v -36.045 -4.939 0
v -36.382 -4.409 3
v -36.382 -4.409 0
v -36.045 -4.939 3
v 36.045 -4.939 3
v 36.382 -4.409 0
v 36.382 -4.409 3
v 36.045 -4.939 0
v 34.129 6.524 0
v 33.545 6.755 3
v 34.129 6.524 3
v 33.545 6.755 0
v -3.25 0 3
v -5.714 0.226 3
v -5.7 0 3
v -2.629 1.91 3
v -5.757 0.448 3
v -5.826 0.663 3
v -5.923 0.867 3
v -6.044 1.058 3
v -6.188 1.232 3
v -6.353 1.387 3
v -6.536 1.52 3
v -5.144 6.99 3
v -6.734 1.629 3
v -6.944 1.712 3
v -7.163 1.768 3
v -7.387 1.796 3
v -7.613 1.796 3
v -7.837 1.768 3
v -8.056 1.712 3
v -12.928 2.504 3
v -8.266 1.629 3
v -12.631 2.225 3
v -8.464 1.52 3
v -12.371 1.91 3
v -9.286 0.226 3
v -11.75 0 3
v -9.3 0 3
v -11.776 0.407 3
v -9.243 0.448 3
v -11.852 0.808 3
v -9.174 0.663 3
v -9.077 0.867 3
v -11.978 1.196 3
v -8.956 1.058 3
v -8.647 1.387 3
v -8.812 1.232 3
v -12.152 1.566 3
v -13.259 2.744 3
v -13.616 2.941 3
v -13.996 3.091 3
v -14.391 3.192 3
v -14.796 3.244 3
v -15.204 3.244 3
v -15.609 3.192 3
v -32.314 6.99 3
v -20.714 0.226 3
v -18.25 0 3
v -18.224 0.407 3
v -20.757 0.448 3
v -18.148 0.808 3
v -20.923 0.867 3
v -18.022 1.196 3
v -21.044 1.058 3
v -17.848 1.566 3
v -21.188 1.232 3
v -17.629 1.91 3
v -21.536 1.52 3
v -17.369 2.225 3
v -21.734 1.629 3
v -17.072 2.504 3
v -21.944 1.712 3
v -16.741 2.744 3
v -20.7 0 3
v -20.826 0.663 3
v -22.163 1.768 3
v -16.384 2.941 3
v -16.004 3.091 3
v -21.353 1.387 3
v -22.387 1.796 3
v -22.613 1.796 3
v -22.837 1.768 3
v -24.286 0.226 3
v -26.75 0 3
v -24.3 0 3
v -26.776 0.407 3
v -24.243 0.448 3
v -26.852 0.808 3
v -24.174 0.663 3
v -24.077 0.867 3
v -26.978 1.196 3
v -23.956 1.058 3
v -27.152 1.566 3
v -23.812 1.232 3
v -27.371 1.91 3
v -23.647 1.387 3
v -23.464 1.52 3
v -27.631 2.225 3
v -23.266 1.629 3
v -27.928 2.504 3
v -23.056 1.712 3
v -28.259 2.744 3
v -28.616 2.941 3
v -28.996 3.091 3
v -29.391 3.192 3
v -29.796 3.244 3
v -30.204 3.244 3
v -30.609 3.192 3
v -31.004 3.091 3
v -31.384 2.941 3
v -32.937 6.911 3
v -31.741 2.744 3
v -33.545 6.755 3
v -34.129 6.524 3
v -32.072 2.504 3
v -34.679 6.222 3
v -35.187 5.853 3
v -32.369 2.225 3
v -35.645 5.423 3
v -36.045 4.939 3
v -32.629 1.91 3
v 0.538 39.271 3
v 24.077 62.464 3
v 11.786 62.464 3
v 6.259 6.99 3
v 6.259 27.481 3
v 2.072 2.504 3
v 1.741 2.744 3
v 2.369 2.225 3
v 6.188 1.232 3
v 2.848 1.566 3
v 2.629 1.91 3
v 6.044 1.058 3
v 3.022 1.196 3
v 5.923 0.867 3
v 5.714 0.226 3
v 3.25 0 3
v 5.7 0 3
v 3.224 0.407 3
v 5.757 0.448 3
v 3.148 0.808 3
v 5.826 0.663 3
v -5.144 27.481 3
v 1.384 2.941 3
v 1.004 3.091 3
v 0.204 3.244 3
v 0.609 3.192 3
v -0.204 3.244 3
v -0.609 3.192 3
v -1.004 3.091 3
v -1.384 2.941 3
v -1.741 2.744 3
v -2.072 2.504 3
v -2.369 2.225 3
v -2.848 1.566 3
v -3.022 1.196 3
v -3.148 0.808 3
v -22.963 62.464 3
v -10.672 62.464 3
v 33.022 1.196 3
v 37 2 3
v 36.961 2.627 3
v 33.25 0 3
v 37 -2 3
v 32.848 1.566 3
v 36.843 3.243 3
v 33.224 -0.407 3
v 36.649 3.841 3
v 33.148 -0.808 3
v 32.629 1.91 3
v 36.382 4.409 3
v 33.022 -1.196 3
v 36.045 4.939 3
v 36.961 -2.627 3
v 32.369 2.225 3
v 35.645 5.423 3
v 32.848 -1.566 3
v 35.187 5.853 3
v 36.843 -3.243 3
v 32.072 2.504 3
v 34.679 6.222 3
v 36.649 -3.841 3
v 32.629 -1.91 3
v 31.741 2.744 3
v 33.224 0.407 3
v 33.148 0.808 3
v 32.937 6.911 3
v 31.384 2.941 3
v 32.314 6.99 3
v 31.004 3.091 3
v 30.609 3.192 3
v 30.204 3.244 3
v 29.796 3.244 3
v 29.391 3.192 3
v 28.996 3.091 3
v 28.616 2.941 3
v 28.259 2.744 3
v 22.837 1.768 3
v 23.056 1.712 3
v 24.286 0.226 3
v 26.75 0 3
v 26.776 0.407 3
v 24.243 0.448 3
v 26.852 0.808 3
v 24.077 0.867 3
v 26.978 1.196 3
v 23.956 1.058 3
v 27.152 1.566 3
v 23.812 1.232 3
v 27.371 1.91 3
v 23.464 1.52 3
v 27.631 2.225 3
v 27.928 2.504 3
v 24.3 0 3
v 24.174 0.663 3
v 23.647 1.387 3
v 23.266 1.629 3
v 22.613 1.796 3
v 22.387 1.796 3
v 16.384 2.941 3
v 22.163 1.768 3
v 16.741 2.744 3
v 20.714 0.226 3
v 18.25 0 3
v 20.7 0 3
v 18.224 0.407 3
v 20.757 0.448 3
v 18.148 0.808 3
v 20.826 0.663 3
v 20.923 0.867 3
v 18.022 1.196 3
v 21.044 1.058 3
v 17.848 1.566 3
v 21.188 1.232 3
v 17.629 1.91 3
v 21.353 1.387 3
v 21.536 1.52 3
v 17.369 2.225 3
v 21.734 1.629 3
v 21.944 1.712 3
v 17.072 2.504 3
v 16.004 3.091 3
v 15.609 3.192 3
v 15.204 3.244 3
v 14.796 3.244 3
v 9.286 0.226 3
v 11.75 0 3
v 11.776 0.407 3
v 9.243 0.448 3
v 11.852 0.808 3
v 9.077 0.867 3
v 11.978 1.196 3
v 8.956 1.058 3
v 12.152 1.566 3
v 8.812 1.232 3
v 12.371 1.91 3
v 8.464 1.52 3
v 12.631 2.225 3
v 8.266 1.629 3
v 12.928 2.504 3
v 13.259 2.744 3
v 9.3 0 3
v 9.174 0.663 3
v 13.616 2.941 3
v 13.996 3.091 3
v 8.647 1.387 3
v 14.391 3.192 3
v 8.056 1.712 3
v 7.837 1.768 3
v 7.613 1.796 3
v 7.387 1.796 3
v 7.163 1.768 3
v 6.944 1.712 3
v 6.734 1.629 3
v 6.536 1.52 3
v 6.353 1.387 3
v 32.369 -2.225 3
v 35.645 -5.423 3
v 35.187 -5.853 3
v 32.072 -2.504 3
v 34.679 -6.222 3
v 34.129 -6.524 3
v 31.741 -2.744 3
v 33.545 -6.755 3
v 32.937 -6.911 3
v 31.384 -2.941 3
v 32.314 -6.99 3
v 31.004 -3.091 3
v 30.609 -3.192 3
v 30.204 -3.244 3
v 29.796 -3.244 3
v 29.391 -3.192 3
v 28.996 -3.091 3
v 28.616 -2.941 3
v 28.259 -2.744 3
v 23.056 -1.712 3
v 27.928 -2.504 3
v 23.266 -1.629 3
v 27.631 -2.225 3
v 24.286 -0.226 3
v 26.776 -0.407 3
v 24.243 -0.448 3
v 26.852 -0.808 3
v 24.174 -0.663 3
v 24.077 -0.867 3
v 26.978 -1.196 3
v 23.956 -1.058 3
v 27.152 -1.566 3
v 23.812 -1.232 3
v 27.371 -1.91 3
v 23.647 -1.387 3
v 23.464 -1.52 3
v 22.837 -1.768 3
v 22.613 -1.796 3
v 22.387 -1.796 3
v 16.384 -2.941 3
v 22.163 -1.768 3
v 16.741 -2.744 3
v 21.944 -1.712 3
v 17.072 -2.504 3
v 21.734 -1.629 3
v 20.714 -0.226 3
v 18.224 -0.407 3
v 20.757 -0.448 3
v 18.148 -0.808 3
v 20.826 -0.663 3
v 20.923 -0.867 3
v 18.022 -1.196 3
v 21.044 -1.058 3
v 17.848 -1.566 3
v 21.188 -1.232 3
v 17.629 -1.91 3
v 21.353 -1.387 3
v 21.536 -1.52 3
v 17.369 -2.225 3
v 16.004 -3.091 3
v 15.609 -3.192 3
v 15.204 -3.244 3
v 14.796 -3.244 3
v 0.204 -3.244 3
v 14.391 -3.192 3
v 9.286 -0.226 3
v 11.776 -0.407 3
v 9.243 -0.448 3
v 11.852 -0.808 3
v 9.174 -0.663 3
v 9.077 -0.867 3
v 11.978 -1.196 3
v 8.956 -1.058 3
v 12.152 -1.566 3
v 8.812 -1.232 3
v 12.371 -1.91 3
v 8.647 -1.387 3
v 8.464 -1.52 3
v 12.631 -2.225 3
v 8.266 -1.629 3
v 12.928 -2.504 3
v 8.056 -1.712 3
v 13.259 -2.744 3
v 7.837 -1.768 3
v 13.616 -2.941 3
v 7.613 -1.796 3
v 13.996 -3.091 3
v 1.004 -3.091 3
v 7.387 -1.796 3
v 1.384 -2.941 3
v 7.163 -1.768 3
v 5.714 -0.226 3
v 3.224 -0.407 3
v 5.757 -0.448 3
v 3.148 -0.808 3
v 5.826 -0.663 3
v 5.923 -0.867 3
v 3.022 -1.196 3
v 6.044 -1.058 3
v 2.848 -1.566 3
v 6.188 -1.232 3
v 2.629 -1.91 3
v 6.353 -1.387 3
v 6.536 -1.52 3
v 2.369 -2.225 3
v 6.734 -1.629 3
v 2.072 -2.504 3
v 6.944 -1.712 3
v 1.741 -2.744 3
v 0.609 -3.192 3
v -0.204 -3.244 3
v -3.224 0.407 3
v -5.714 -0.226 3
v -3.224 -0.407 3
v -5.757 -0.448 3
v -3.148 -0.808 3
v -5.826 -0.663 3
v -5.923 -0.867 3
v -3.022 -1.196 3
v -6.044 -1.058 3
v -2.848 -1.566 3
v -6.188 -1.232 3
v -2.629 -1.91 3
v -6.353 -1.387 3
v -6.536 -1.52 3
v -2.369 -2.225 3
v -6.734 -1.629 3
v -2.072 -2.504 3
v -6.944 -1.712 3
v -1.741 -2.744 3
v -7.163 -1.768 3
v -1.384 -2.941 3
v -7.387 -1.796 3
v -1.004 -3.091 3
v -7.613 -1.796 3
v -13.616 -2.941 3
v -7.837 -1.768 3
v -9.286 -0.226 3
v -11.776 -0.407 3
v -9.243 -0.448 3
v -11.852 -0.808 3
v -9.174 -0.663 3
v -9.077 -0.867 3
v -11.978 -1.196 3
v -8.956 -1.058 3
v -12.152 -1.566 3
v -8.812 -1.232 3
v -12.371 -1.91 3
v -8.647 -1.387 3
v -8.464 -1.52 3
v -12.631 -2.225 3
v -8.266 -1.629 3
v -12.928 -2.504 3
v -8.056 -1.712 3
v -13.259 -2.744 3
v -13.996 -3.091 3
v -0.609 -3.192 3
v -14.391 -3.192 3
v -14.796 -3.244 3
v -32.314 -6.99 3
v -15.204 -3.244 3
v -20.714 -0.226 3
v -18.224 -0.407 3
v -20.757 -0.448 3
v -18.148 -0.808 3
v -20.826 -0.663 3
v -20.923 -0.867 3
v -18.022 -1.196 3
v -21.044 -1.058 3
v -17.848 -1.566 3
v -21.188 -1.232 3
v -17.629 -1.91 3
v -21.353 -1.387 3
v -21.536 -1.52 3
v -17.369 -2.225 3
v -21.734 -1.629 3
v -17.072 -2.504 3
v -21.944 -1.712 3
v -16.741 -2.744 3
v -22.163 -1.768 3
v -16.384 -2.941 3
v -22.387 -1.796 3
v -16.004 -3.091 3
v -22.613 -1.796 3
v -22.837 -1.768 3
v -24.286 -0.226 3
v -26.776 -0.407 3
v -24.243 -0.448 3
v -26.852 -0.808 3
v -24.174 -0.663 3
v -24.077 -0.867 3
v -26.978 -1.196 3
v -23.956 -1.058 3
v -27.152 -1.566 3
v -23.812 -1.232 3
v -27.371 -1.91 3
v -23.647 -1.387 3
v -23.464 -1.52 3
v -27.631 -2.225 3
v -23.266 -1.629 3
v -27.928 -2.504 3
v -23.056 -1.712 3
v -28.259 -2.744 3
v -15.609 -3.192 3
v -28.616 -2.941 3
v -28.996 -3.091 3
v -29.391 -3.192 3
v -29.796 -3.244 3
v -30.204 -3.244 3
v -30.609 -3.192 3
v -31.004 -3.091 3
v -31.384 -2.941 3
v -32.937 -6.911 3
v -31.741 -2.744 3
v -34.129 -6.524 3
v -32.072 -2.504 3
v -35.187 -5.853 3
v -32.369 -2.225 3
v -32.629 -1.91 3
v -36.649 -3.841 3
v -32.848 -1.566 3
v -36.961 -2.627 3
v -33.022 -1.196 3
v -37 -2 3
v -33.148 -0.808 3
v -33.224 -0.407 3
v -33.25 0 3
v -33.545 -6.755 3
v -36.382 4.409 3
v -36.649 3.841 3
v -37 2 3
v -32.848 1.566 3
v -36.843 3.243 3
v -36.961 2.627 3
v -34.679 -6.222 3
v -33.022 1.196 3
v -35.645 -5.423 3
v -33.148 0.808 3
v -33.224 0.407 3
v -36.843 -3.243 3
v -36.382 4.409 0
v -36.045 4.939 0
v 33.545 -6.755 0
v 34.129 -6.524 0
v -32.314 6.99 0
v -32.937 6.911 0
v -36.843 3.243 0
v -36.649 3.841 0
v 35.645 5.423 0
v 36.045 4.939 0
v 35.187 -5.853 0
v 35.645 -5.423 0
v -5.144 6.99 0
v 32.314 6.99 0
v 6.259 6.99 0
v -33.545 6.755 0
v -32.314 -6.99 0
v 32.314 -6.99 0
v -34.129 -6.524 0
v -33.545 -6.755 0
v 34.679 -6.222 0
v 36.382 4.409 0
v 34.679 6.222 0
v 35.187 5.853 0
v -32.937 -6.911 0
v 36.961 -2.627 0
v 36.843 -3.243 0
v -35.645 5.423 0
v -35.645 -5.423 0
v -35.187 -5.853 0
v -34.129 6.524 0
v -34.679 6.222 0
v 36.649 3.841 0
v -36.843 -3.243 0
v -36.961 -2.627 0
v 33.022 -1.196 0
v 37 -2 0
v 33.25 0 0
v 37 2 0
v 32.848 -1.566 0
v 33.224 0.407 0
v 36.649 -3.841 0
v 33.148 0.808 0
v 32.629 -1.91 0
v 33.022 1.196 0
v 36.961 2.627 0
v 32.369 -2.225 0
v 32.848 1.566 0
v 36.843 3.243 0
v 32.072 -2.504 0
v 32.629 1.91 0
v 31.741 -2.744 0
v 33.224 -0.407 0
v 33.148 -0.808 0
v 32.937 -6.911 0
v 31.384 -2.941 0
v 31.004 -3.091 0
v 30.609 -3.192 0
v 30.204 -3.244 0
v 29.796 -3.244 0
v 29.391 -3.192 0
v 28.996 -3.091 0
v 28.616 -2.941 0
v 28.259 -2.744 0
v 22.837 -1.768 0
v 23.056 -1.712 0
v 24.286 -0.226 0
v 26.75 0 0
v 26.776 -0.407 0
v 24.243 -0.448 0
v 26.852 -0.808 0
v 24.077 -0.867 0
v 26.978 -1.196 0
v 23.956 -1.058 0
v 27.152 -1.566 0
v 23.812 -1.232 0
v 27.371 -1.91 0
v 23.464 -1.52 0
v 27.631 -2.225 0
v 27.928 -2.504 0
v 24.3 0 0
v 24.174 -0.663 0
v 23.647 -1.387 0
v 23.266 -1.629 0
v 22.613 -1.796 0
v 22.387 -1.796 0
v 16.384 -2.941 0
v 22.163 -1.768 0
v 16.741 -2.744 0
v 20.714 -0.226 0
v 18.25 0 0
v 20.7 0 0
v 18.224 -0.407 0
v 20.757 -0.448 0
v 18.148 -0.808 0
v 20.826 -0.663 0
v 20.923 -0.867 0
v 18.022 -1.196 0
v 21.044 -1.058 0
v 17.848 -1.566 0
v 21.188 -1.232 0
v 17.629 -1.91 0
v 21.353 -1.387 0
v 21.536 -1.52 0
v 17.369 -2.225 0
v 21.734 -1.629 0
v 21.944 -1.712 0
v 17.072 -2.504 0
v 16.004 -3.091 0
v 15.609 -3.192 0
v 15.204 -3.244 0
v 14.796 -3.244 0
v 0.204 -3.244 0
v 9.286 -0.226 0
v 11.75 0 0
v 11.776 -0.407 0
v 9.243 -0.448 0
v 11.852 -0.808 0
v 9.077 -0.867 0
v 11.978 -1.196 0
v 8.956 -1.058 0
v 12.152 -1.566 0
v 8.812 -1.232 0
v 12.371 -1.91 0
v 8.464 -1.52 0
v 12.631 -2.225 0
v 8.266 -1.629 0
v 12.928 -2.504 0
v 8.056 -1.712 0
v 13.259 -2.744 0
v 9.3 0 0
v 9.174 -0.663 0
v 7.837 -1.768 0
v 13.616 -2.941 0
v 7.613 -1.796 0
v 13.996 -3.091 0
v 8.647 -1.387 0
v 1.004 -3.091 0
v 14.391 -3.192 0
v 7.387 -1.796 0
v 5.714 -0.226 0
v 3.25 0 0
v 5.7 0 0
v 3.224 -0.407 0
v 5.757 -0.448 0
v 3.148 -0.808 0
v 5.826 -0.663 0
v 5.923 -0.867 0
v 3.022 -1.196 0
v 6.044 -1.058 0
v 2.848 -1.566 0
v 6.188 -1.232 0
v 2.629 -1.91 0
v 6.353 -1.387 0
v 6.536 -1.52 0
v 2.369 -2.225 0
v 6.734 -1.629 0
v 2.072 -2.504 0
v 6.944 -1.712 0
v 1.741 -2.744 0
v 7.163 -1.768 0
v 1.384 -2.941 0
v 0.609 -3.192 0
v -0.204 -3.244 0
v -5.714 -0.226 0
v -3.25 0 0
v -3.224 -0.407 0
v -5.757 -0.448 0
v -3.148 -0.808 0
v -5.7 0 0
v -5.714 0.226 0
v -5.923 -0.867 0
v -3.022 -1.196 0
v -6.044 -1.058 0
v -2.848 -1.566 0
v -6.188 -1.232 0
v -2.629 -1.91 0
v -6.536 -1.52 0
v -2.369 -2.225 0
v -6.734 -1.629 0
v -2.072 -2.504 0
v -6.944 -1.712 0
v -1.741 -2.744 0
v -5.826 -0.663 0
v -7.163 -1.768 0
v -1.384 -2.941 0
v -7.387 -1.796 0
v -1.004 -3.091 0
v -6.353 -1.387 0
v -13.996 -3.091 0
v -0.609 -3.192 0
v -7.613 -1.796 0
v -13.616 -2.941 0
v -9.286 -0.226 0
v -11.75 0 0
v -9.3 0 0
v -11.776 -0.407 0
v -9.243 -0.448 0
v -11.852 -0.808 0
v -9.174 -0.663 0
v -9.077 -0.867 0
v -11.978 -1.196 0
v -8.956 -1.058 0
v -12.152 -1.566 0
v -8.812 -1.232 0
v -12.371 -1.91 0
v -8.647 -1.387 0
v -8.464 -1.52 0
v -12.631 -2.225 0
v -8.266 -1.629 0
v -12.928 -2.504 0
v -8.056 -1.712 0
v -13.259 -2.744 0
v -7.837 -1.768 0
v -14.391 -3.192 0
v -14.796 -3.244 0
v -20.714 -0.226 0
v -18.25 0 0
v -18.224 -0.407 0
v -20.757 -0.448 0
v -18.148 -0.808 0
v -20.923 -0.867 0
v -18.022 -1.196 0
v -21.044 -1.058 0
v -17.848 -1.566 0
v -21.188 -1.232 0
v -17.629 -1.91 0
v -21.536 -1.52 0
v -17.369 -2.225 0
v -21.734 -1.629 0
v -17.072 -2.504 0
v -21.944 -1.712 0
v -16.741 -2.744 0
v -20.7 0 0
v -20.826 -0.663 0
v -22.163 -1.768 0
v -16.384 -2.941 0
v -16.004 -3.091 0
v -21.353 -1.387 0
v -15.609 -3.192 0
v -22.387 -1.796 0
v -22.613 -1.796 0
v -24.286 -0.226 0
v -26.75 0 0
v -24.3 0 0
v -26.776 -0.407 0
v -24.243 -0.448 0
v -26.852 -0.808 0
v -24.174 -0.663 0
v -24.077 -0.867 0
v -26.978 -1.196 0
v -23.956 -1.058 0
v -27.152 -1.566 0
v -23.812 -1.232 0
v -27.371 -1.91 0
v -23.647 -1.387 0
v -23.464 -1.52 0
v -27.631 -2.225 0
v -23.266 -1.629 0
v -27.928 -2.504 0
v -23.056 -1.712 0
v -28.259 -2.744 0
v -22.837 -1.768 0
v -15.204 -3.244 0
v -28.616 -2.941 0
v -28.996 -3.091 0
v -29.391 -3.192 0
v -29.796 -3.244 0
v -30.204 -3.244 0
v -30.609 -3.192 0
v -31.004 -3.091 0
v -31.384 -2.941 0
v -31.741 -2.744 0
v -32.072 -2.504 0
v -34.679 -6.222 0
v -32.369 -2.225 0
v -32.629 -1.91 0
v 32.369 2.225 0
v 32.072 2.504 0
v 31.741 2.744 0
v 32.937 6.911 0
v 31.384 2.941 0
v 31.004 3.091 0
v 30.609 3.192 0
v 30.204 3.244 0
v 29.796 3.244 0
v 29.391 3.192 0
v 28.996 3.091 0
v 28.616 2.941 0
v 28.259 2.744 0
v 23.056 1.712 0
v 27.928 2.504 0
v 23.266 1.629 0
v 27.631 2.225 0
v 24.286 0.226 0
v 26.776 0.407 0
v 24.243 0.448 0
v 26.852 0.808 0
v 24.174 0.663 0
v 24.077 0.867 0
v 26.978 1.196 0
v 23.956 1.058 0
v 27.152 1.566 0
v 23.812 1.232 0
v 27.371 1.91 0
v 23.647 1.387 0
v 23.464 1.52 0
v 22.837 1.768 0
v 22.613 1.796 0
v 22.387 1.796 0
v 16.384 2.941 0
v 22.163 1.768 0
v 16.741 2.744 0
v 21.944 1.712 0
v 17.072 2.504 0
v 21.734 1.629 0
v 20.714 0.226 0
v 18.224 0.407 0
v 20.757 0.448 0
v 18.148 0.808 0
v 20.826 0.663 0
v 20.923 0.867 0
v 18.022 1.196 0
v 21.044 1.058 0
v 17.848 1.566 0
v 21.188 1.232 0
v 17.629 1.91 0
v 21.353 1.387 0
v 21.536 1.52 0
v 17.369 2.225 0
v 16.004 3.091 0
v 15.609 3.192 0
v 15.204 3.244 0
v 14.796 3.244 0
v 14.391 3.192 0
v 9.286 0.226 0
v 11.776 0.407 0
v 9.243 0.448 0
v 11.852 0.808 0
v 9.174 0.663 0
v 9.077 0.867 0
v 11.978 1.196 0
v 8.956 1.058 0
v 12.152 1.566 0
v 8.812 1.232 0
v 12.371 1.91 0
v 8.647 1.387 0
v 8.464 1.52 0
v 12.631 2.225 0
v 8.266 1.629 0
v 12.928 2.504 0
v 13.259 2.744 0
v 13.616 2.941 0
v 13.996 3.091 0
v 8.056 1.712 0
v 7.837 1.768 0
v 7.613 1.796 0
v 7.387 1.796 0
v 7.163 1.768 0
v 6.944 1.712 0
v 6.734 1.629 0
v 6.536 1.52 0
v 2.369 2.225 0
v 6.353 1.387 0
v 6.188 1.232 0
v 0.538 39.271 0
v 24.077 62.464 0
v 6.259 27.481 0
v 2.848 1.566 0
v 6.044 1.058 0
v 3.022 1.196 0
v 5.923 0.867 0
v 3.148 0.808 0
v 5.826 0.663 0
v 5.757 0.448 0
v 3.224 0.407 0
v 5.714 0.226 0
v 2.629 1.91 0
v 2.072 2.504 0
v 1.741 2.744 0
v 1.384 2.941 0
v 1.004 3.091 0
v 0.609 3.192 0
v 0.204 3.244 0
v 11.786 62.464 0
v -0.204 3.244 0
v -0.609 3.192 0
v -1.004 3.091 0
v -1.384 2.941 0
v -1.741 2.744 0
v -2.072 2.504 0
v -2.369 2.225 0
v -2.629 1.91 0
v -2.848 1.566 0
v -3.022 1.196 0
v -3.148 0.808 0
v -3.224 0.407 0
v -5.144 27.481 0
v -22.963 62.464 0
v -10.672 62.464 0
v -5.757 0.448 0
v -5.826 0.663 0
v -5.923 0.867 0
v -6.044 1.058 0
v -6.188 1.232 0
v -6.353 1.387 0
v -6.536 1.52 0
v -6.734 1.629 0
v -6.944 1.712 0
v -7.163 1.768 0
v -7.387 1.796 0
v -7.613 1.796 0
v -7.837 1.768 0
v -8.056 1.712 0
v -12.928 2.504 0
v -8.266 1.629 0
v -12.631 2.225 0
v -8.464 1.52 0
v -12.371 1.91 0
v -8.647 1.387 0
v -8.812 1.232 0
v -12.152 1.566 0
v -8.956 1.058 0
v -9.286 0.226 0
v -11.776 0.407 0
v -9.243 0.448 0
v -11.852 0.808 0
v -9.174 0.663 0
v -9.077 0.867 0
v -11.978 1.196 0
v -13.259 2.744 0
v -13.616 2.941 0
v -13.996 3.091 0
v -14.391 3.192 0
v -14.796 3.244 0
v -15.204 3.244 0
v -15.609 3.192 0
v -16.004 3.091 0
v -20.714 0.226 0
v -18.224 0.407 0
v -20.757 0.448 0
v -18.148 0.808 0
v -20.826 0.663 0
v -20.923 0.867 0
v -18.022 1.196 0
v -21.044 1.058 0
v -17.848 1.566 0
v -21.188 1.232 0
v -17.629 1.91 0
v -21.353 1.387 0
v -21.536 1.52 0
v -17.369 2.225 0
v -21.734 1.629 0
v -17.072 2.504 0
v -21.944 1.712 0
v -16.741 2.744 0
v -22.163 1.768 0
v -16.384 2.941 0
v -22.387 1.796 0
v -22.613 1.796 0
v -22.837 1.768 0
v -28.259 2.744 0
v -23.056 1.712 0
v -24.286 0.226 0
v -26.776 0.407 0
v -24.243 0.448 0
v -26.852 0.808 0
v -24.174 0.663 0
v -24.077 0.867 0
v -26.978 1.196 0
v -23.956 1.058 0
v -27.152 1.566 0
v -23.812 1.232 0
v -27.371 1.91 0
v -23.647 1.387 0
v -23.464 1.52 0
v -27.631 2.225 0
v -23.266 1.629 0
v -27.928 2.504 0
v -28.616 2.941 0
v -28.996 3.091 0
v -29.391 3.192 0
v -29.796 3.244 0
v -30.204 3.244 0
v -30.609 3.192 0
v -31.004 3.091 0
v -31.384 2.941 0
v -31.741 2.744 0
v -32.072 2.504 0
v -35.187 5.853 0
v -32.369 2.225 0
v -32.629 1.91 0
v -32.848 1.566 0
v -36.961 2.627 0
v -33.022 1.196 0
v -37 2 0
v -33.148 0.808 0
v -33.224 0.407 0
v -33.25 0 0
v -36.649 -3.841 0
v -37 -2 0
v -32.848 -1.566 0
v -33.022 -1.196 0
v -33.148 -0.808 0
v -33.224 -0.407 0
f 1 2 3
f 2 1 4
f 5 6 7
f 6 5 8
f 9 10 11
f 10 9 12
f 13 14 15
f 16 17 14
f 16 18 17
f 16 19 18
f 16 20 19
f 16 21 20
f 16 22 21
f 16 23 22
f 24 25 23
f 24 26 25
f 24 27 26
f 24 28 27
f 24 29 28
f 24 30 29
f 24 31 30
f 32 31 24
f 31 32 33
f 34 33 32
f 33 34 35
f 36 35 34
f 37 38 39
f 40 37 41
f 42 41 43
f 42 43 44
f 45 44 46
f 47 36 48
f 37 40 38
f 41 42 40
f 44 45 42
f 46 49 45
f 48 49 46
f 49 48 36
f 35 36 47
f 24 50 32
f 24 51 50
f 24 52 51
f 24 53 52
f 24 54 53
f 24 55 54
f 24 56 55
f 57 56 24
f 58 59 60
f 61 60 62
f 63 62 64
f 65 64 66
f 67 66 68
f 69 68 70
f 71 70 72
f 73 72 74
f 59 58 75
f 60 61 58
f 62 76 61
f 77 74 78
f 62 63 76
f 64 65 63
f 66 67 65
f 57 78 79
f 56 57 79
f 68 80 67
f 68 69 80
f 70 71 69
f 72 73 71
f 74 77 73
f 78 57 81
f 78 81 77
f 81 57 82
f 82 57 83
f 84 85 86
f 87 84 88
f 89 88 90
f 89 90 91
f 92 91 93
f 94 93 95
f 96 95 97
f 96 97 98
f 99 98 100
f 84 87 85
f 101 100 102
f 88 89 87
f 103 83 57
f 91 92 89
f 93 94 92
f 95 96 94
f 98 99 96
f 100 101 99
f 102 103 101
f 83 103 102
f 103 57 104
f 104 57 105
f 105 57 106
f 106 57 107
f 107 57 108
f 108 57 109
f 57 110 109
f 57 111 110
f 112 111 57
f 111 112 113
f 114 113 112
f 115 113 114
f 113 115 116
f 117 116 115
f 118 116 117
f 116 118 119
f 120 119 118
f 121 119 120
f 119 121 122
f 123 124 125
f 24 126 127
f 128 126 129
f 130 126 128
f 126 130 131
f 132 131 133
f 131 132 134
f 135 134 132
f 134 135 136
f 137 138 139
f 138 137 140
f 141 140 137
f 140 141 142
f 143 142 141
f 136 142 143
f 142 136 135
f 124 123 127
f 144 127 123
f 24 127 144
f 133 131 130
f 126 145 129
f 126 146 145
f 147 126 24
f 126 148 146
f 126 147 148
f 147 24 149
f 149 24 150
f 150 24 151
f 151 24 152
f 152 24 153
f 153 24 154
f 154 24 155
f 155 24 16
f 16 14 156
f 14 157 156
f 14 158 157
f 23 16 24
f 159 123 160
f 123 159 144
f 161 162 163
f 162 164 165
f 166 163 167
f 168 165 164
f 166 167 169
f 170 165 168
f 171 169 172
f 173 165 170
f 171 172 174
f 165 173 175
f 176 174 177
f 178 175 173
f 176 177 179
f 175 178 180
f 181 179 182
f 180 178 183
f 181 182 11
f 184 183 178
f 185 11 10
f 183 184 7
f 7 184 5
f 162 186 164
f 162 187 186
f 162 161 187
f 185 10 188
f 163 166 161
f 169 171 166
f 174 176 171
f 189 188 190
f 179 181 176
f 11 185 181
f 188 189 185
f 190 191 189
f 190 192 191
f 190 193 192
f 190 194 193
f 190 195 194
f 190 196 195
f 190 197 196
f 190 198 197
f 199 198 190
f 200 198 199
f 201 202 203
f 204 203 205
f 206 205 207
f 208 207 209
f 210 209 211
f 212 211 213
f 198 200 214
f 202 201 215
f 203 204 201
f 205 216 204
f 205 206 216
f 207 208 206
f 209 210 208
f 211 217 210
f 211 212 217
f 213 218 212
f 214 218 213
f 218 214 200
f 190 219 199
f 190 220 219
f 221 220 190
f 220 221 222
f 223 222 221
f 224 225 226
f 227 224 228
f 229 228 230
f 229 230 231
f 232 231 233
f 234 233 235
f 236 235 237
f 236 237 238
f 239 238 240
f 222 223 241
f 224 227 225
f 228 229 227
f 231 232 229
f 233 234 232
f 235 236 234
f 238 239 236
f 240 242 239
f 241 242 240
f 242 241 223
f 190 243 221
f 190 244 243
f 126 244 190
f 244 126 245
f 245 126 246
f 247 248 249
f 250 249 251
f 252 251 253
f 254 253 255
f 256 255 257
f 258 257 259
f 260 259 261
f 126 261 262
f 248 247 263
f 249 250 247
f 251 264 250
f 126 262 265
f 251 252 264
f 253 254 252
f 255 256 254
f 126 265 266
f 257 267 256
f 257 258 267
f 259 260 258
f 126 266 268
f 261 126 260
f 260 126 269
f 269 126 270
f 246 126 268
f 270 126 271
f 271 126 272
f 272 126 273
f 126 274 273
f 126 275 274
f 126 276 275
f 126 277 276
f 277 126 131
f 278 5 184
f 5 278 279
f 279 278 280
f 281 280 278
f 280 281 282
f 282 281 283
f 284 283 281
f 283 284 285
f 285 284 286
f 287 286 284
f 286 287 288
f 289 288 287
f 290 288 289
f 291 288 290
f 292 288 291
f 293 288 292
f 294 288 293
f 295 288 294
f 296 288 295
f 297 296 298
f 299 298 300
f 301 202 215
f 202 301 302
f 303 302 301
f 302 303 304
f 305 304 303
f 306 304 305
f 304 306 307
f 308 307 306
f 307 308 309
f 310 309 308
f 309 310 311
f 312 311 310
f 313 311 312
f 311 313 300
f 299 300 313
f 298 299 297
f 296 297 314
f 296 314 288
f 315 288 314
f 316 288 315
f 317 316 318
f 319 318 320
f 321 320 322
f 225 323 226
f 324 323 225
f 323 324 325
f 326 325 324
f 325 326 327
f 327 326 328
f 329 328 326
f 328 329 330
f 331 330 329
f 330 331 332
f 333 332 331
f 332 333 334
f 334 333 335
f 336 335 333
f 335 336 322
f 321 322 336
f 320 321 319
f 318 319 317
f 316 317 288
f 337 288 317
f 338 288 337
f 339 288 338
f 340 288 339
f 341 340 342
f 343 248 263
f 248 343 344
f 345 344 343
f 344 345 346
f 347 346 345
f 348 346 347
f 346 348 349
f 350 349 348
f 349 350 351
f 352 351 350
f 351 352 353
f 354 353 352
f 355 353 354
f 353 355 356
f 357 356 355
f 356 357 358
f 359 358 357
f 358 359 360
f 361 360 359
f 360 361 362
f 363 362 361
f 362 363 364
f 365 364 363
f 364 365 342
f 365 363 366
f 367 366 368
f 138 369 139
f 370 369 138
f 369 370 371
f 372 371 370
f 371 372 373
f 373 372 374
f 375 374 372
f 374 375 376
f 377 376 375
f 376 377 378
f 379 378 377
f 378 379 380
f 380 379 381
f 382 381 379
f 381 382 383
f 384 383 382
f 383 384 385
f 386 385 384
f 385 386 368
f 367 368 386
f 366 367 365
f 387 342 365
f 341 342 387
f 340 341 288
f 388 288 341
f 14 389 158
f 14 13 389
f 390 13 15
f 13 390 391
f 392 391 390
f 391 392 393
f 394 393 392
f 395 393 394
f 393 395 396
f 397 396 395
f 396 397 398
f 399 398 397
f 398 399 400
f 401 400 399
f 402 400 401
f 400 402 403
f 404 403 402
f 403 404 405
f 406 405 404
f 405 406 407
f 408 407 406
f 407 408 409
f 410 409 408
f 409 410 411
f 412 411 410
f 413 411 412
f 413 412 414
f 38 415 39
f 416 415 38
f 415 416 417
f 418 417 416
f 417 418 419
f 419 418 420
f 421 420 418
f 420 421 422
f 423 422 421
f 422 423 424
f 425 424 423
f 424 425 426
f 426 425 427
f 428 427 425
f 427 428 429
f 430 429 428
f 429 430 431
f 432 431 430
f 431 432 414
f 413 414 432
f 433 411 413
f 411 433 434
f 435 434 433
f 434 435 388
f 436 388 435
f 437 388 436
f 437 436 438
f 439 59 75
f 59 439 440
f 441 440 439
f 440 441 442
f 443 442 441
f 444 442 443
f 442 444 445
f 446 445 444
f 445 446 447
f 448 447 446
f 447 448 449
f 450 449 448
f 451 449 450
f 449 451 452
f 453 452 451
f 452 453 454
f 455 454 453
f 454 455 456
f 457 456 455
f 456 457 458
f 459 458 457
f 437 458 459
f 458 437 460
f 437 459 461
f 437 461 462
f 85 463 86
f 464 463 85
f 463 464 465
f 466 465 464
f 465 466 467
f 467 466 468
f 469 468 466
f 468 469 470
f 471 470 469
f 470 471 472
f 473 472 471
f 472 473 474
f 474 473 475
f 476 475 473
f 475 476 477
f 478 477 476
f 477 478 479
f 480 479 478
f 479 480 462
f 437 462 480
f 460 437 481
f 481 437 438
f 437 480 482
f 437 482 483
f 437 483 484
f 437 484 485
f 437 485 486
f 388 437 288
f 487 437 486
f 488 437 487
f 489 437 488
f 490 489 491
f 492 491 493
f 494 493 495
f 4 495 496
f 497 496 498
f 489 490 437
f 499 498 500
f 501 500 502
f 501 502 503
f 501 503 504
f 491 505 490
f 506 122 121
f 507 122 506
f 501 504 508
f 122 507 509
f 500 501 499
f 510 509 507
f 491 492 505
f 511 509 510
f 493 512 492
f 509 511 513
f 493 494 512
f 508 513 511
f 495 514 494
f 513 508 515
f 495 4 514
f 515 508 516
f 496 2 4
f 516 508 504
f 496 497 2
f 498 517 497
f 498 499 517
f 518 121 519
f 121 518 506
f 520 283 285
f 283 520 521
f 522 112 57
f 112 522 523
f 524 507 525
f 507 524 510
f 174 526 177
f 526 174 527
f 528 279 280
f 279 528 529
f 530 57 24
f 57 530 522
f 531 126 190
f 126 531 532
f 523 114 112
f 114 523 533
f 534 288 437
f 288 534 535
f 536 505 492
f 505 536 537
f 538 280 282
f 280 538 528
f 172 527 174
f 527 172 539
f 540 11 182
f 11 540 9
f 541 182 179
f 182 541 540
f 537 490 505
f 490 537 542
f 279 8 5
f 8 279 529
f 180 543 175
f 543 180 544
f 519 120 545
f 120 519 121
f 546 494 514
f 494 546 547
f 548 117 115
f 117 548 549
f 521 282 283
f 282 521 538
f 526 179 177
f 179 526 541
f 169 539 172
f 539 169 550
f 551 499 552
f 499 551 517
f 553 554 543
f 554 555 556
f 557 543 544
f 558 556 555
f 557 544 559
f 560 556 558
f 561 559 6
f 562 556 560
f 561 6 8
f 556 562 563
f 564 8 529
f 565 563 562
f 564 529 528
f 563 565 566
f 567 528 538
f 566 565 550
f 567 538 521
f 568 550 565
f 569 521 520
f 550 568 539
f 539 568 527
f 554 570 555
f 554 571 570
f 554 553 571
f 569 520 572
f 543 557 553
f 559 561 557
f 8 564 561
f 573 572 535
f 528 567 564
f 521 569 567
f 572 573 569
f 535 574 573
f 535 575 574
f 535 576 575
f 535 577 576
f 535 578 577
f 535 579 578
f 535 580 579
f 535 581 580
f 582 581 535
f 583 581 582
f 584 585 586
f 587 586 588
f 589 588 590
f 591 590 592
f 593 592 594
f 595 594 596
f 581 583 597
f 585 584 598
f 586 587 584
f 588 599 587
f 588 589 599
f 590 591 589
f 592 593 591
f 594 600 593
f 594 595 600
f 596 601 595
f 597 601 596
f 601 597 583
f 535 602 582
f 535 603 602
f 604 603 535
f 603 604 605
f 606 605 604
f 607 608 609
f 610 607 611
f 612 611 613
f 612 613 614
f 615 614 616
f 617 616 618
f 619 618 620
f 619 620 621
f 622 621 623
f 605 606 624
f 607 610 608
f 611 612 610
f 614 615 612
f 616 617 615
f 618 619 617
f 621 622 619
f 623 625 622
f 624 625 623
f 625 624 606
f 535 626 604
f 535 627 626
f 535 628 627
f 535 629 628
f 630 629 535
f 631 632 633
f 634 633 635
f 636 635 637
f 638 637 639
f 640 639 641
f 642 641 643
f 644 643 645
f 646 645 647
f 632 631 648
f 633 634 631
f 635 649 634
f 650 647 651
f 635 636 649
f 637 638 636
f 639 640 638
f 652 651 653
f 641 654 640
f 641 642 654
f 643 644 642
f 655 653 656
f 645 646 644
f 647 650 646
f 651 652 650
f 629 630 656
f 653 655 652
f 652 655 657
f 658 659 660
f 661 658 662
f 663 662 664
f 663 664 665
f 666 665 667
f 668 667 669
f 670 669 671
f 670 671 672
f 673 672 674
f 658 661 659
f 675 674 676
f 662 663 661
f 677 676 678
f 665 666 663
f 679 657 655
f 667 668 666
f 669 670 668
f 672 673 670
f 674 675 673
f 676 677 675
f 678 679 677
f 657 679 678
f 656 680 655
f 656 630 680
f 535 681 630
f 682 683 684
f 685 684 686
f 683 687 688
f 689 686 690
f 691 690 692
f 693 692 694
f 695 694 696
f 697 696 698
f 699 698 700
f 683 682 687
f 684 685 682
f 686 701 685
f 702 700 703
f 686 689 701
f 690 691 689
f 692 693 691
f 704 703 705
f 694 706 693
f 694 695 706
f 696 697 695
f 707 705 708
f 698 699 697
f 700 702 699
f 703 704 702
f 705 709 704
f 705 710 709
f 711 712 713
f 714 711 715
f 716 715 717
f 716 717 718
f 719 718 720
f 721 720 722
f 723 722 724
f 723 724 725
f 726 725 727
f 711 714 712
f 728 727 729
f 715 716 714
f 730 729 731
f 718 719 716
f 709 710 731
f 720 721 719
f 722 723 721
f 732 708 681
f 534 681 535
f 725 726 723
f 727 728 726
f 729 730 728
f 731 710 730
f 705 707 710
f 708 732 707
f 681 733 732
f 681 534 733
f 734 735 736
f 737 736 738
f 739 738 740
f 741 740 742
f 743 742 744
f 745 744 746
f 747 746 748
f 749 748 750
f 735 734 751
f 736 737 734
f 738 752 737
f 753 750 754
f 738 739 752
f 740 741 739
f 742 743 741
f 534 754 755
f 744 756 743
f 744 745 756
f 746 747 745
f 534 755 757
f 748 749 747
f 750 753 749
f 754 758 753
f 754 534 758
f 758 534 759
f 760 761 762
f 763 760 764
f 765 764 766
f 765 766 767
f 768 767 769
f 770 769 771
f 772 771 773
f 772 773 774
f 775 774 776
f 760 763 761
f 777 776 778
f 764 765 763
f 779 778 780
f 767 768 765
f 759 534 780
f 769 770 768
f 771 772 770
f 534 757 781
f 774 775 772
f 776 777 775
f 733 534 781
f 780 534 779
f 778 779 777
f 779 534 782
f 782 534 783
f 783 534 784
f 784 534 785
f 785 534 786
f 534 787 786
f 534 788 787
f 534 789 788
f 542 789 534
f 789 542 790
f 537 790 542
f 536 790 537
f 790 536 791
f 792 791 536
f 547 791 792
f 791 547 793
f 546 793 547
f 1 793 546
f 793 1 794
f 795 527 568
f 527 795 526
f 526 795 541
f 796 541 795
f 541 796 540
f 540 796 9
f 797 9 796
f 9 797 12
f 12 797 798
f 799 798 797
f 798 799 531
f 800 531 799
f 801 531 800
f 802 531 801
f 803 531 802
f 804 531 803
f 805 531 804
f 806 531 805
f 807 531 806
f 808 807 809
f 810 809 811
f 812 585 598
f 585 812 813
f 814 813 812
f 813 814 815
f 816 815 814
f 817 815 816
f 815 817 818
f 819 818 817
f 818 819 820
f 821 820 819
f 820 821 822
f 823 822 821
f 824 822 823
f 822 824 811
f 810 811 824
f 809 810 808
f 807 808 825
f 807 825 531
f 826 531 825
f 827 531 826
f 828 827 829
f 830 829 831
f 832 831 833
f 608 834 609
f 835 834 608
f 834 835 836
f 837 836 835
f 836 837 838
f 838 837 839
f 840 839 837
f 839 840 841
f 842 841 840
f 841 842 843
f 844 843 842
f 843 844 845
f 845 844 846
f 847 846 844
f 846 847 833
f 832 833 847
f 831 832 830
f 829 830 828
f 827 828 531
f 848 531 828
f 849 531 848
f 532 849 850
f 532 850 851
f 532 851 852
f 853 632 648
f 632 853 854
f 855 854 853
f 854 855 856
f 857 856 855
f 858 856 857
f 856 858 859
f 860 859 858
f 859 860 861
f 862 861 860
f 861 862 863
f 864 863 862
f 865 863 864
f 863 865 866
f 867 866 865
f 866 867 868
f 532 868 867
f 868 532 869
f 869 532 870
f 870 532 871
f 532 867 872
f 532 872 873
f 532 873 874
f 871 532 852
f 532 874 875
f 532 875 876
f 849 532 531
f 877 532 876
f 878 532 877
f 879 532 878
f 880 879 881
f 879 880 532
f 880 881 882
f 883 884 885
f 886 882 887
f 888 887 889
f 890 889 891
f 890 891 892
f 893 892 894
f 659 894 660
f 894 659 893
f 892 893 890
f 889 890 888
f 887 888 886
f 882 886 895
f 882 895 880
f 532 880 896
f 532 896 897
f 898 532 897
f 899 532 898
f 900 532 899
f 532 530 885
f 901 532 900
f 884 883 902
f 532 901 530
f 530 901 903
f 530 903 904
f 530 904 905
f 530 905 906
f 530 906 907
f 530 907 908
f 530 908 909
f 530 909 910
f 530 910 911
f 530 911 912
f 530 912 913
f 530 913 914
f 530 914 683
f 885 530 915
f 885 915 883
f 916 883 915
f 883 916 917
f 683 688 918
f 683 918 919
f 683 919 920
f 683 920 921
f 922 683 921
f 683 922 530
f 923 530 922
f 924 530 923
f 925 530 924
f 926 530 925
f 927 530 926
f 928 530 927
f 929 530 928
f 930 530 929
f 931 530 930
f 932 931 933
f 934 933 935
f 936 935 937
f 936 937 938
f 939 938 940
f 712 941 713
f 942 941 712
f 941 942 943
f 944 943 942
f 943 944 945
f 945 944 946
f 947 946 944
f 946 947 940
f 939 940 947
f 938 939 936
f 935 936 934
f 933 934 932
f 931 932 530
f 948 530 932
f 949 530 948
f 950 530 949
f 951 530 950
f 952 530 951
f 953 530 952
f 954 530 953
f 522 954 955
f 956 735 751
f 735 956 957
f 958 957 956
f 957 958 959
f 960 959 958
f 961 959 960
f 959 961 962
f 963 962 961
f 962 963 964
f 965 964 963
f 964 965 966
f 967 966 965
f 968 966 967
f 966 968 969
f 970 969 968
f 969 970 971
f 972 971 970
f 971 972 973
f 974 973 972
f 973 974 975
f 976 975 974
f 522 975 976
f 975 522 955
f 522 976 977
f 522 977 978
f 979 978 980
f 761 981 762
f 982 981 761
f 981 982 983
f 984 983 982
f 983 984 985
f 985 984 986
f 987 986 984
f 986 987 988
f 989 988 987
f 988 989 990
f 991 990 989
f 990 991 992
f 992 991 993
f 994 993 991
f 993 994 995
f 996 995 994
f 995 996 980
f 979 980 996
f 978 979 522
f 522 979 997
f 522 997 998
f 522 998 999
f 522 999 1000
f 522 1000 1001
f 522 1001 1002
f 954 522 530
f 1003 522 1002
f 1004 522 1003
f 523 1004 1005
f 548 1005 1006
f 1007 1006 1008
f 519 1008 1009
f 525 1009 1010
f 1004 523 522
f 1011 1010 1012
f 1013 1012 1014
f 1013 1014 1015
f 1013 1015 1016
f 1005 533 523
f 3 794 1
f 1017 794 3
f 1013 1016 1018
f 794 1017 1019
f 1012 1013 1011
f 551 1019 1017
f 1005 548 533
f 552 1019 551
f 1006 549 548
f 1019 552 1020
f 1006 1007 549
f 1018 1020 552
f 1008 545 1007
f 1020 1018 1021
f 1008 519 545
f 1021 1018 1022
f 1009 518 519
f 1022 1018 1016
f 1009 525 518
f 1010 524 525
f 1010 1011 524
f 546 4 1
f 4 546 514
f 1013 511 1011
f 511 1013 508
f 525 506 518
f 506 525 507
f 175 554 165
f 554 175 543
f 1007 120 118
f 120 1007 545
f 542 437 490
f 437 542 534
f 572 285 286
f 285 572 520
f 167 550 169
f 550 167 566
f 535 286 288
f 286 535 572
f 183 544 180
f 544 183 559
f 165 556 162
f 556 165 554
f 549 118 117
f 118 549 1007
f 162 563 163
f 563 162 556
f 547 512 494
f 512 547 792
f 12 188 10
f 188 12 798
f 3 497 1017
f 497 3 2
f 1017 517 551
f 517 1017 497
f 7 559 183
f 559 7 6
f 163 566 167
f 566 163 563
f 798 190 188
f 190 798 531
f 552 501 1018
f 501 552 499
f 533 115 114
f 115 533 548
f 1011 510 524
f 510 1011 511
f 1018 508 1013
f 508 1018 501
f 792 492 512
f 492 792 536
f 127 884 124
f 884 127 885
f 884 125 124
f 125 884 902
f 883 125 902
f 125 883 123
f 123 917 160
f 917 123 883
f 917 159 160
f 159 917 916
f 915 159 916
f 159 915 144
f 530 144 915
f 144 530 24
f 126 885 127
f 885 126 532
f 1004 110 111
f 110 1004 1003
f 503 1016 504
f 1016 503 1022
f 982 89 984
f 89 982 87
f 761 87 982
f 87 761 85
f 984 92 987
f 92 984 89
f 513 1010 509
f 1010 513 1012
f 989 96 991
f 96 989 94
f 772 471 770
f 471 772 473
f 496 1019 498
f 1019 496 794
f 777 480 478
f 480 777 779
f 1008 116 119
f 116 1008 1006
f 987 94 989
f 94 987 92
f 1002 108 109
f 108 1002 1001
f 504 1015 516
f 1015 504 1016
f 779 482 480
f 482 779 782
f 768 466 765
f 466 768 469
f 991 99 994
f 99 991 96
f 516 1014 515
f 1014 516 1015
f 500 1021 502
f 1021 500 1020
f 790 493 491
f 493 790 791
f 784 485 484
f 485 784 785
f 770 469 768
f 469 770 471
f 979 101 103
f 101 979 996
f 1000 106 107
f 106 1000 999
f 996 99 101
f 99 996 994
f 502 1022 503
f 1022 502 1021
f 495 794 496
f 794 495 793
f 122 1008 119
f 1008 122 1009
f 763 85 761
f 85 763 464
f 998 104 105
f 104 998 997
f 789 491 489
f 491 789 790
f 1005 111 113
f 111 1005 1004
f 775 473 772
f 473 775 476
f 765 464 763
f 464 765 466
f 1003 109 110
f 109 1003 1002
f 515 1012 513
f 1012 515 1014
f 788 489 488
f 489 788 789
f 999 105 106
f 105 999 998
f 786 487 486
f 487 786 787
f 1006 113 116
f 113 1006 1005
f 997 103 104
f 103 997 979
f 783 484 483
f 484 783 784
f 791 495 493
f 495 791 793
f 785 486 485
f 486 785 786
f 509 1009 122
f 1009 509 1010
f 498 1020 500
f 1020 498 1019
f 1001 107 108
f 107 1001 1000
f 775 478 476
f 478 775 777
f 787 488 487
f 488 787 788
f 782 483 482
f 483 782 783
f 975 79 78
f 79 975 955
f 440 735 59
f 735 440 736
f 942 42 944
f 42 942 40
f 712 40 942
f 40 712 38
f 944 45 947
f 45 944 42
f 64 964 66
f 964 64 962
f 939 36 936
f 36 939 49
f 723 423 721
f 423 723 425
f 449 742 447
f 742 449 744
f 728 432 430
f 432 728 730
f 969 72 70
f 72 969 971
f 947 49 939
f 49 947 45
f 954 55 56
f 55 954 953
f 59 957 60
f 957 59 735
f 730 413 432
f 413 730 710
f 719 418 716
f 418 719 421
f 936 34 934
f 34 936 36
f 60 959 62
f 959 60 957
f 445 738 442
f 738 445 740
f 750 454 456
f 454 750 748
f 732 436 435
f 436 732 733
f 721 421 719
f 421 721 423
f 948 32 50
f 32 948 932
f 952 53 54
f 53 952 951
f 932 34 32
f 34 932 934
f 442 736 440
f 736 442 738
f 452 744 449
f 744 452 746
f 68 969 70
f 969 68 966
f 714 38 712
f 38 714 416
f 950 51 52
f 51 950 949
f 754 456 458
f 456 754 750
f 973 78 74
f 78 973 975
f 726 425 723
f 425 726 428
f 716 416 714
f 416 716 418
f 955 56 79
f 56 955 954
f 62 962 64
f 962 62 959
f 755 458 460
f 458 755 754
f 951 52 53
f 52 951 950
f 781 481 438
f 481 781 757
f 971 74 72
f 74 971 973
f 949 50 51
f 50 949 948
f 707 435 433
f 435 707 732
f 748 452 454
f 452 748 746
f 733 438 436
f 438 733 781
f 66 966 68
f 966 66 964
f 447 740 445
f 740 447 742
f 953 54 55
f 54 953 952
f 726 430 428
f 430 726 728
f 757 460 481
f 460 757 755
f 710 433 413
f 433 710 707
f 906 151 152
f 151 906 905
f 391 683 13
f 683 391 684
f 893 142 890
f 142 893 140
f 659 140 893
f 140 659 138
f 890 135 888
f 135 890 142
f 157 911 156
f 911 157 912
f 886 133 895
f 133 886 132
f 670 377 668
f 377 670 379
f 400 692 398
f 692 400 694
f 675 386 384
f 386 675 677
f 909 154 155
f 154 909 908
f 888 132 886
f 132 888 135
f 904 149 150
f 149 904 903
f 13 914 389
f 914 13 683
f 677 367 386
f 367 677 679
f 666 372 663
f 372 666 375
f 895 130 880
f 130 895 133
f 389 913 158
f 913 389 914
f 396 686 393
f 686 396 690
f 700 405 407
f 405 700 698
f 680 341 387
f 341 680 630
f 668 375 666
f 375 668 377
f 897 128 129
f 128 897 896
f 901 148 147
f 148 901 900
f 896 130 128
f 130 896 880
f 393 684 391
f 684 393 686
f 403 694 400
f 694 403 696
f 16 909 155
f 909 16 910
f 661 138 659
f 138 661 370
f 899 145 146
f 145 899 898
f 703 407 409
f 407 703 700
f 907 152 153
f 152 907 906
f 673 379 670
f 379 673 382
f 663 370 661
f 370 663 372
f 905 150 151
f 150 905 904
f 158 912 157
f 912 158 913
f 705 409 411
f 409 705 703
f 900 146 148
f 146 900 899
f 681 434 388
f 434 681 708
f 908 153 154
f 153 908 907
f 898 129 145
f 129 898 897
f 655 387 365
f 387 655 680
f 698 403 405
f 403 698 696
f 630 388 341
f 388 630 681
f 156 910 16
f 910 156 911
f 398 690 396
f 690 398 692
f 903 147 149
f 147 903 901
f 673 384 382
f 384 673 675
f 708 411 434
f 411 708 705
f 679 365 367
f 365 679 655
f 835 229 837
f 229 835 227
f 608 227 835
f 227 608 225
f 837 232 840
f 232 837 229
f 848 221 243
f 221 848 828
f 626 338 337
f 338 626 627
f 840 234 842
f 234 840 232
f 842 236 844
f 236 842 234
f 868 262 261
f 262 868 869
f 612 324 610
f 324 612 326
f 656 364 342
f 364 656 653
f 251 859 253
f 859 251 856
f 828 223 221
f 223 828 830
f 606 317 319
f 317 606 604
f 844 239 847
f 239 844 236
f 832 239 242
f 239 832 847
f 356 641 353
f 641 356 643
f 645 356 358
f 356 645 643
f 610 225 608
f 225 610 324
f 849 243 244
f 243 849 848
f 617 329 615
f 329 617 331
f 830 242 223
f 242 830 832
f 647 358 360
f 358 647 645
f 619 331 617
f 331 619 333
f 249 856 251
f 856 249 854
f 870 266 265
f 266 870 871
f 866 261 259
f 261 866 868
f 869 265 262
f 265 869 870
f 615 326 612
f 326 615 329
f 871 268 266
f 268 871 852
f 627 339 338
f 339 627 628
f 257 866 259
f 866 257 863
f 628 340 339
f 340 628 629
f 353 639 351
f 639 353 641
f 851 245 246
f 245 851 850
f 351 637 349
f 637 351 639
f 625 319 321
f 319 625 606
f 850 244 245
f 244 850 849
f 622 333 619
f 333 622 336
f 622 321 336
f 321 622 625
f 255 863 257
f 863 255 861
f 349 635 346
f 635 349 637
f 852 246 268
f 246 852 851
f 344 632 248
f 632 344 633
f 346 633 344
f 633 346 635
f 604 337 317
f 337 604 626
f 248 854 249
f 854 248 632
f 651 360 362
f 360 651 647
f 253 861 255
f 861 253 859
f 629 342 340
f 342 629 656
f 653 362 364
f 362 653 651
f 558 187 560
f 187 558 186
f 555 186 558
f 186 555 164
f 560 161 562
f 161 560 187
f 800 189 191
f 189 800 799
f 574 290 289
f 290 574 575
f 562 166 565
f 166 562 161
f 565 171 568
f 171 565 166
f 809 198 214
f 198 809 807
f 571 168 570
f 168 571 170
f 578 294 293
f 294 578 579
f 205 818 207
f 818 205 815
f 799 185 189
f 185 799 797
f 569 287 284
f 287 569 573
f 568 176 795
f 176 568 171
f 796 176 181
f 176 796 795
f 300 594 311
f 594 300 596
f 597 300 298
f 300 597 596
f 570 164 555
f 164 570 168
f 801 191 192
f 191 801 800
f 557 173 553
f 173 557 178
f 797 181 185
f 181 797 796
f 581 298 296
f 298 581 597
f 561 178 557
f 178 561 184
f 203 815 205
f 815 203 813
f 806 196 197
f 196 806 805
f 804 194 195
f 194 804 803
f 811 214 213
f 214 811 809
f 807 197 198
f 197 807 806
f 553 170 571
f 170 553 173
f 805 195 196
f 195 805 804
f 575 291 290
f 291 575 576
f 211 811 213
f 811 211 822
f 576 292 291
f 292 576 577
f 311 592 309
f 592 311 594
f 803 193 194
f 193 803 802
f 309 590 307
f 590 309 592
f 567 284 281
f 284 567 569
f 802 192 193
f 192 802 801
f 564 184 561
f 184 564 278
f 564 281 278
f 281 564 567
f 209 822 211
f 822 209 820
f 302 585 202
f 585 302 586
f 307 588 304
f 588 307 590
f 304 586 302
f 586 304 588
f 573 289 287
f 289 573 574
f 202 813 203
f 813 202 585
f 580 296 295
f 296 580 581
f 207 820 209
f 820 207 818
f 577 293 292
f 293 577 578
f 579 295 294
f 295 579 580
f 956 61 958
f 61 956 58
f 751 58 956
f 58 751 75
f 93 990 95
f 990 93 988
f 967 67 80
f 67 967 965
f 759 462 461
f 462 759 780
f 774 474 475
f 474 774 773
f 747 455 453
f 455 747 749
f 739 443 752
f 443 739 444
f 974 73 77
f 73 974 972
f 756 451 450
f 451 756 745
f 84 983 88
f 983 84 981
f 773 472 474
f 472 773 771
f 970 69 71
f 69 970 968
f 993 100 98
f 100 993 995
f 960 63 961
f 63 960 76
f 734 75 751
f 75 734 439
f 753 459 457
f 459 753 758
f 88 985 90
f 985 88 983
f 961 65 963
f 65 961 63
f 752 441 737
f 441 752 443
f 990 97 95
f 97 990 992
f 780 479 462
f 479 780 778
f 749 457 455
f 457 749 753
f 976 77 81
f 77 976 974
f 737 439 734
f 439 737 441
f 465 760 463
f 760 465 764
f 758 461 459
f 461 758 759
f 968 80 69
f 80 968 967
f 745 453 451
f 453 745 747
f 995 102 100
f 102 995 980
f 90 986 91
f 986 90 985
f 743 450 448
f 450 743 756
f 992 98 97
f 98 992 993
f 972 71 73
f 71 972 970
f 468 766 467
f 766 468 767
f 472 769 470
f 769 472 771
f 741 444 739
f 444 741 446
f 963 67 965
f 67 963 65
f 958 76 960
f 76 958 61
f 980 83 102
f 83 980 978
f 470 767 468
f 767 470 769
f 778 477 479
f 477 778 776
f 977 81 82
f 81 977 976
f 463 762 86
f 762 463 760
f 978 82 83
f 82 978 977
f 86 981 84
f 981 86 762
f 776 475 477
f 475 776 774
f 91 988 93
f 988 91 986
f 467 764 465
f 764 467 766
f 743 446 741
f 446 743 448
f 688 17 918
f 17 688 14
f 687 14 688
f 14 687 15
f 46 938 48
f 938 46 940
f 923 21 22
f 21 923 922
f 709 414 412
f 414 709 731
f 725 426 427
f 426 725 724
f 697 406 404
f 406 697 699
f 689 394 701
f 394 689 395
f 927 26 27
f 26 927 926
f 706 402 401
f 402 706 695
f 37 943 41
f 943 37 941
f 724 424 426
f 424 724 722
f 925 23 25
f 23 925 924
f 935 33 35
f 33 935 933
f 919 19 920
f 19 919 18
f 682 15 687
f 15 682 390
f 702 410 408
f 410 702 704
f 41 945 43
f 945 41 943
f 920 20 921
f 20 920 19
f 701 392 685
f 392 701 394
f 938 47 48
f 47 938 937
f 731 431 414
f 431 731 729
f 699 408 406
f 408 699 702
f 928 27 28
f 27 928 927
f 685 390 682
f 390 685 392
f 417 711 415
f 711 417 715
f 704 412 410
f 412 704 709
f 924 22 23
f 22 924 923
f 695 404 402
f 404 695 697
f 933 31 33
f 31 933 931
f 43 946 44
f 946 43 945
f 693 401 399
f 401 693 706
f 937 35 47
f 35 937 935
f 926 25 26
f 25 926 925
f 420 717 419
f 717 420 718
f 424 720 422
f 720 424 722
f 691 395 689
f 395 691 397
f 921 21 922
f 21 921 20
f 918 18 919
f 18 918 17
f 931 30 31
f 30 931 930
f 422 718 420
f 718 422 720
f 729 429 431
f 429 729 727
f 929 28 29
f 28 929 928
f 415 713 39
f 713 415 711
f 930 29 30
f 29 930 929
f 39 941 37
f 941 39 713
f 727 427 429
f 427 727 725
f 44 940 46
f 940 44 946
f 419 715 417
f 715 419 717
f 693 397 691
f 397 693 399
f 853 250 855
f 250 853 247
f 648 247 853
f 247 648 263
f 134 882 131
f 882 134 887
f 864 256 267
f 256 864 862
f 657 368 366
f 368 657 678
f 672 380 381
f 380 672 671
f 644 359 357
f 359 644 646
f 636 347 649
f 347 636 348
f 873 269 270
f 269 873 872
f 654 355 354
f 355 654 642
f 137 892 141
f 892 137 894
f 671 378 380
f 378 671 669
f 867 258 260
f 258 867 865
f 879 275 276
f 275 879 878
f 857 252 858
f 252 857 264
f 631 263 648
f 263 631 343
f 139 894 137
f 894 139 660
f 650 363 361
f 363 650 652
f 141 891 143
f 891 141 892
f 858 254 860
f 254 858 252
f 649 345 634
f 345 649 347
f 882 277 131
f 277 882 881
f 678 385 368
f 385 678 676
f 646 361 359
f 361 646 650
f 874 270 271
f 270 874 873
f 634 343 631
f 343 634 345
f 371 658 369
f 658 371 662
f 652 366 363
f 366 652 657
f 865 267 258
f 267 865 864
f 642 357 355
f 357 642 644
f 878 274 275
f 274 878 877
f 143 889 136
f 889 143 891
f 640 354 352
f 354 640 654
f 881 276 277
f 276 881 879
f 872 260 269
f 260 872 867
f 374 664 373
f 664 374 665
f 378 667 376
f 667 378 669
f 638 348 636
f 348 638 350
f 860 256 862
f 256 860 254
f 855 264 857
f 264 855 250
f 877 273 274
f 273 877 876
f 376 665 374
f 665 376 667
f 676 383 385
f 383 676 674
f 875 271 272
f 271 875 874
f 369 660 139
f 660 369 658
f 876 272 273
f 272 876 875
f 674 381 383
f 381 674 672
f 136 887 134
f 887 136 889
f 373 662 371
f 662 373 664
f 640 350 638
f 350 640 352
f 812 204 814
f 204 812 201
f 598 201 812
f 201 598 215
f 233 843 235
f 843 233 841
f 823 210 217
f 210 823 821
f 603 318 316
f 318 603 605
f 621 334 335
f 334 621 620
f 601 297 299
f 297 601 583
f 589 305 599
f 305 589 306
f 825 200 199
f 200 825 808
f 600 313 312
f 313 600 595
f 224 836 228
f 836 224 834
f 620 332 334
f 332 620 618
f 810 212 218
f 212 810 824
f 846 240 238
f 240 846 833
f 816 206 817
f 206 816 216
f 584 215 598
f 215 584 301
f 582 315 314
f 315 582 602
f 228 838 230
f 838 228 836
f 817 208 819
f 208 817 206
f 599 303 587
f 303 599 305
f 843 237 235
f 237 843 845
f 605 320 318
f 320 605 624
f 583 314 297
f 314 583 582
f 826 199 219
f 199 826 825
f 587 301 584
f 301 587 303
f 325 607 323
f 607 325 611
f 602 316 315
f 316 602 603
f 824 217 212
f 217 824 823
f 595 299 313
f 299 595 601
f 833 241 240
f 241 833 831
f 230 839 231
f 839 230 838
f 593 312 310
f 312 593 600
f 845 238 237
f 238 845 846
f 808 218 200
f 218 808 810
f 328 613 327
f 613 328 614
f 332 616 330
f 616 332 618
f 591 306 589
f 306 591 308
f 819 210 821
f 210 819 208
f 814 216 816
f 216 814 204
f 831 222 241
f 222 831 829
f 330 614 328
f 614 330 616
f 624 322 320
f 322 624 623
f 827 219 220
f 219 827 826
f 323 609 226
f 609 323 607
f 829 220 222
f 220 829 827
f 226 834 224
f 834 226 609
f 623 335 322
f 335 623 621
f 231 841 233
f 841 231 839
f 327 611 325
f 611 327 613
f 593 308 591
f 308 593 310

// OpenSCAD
$fn = 50;


difference() {
	union() {
		hull() {
			translate(v = [-32.0000000000, 2.0000000000, 0]) {
				cylinder(h = 3, r = 5);
			}
			translate(v = [32.0000000000, 2.0000000000, 0]) {
				cylinder(h = 3, r = 5);
			}
			translate(v = [-32.0000000000, -2.0000000000, 0]) {
				cylinder(h = 3, r = 5);
			}
			translate(v = [32.0000000000, -2.0000000000, 0]) {
				cylinder(h = 3, r = 5);
			}
		}
		translate(v = [0, 61.1111111111, 0]) {
			linear_extrude(height = 3) {
				text(font = "DejaVu Sans Mono:style=Bold", halign = "center", size = 57.0000000000, text = "Y", valign = "top");
			}
		}
	}
	union() {
		translate(v = [-30.0000000000, 0.0000000000, 0]) {
			translate(v = [0, 0, -100]) {
				cylinder(h = 200, r = 3.2500000000);
			}
		}
		translate(v = [-15.0000000000, 0.0000000000, 0]) {
			translate(v = [0, 0, -100]) {
				cylinder(h = 200, r = 3.2500000000);
			}
		}
		translate(v = [0, 0, -100]) {
			cylinder(h = 200, r = 3.2500000000);
		}
		translate(v = [15.0000000000, 0.0000000000, 0]) {
			translate(v = [0, 0, -100]) {
				cylinder(h = 200, r = 3.2500000000);
			}
		}
		translate(v = [30.0000000000, 0.0000000000, 0]) {
			translate(v = [0, 0, -100]) {
				cylinder(h = 200, r = 3.2500000000);
			}
		}
		translate(v = [-30.0000000000, 0.0000000000, 0]) {
			translate(v = [0, 0, -100]) {
				cylinder(h = 200, r = 1.8000000000);
			}
		}
		translate(v = [-22.5000000000, 0.0000000000, 0]) {
			translate(v = [0, 0, -100]) {
				cylinder(h = 200, r = 1.8000000000);
			}
		}
		translate(v = [-15.0000000000, 0.0000000000, 0]) {
			translate(v = [0, 0, -100]) {
				cylinder(h = 200, r = 1.8000000000);
			}
		}
		translate(v = [-7.5000000000, 0.0000000000, 0]) {
			translate(v = [0, 0, -100]) {
				cylinder(h = 200, r = 1.8000000000);
			}
		}
		translate(v = [0, 0, -100]) {
			cylinder(h = 200, r = 1.8000000000);
		}
		translate(v = [7.5000000000, 0.0000000000, 0]) {
			translate(v = [0, 0, -100]) {
				cylinder(h = 200, r = 1.8000000000);
			}
		}
		translate(v = [15.0000000000, 0.0000000000, 0]) {
			translate(v = [0, 0, -100]) {
				cylinder(h = 200, r = 1.8000000000);
			}
		}
		translate(v = [22.5000000000, 0.0000000000, 0]) {
			translate(v = [0, 0, -100]) {
				cylinder(h = 200, r = 1.8000000000);
			}
		}
		translate(v = [30.0000000000, 0.0000000000, 0]) {
			translate(v = [0, 0, -100]) {
				cylinder(h = 200, r = 1.8000000000);
			}
		}
	}
}
